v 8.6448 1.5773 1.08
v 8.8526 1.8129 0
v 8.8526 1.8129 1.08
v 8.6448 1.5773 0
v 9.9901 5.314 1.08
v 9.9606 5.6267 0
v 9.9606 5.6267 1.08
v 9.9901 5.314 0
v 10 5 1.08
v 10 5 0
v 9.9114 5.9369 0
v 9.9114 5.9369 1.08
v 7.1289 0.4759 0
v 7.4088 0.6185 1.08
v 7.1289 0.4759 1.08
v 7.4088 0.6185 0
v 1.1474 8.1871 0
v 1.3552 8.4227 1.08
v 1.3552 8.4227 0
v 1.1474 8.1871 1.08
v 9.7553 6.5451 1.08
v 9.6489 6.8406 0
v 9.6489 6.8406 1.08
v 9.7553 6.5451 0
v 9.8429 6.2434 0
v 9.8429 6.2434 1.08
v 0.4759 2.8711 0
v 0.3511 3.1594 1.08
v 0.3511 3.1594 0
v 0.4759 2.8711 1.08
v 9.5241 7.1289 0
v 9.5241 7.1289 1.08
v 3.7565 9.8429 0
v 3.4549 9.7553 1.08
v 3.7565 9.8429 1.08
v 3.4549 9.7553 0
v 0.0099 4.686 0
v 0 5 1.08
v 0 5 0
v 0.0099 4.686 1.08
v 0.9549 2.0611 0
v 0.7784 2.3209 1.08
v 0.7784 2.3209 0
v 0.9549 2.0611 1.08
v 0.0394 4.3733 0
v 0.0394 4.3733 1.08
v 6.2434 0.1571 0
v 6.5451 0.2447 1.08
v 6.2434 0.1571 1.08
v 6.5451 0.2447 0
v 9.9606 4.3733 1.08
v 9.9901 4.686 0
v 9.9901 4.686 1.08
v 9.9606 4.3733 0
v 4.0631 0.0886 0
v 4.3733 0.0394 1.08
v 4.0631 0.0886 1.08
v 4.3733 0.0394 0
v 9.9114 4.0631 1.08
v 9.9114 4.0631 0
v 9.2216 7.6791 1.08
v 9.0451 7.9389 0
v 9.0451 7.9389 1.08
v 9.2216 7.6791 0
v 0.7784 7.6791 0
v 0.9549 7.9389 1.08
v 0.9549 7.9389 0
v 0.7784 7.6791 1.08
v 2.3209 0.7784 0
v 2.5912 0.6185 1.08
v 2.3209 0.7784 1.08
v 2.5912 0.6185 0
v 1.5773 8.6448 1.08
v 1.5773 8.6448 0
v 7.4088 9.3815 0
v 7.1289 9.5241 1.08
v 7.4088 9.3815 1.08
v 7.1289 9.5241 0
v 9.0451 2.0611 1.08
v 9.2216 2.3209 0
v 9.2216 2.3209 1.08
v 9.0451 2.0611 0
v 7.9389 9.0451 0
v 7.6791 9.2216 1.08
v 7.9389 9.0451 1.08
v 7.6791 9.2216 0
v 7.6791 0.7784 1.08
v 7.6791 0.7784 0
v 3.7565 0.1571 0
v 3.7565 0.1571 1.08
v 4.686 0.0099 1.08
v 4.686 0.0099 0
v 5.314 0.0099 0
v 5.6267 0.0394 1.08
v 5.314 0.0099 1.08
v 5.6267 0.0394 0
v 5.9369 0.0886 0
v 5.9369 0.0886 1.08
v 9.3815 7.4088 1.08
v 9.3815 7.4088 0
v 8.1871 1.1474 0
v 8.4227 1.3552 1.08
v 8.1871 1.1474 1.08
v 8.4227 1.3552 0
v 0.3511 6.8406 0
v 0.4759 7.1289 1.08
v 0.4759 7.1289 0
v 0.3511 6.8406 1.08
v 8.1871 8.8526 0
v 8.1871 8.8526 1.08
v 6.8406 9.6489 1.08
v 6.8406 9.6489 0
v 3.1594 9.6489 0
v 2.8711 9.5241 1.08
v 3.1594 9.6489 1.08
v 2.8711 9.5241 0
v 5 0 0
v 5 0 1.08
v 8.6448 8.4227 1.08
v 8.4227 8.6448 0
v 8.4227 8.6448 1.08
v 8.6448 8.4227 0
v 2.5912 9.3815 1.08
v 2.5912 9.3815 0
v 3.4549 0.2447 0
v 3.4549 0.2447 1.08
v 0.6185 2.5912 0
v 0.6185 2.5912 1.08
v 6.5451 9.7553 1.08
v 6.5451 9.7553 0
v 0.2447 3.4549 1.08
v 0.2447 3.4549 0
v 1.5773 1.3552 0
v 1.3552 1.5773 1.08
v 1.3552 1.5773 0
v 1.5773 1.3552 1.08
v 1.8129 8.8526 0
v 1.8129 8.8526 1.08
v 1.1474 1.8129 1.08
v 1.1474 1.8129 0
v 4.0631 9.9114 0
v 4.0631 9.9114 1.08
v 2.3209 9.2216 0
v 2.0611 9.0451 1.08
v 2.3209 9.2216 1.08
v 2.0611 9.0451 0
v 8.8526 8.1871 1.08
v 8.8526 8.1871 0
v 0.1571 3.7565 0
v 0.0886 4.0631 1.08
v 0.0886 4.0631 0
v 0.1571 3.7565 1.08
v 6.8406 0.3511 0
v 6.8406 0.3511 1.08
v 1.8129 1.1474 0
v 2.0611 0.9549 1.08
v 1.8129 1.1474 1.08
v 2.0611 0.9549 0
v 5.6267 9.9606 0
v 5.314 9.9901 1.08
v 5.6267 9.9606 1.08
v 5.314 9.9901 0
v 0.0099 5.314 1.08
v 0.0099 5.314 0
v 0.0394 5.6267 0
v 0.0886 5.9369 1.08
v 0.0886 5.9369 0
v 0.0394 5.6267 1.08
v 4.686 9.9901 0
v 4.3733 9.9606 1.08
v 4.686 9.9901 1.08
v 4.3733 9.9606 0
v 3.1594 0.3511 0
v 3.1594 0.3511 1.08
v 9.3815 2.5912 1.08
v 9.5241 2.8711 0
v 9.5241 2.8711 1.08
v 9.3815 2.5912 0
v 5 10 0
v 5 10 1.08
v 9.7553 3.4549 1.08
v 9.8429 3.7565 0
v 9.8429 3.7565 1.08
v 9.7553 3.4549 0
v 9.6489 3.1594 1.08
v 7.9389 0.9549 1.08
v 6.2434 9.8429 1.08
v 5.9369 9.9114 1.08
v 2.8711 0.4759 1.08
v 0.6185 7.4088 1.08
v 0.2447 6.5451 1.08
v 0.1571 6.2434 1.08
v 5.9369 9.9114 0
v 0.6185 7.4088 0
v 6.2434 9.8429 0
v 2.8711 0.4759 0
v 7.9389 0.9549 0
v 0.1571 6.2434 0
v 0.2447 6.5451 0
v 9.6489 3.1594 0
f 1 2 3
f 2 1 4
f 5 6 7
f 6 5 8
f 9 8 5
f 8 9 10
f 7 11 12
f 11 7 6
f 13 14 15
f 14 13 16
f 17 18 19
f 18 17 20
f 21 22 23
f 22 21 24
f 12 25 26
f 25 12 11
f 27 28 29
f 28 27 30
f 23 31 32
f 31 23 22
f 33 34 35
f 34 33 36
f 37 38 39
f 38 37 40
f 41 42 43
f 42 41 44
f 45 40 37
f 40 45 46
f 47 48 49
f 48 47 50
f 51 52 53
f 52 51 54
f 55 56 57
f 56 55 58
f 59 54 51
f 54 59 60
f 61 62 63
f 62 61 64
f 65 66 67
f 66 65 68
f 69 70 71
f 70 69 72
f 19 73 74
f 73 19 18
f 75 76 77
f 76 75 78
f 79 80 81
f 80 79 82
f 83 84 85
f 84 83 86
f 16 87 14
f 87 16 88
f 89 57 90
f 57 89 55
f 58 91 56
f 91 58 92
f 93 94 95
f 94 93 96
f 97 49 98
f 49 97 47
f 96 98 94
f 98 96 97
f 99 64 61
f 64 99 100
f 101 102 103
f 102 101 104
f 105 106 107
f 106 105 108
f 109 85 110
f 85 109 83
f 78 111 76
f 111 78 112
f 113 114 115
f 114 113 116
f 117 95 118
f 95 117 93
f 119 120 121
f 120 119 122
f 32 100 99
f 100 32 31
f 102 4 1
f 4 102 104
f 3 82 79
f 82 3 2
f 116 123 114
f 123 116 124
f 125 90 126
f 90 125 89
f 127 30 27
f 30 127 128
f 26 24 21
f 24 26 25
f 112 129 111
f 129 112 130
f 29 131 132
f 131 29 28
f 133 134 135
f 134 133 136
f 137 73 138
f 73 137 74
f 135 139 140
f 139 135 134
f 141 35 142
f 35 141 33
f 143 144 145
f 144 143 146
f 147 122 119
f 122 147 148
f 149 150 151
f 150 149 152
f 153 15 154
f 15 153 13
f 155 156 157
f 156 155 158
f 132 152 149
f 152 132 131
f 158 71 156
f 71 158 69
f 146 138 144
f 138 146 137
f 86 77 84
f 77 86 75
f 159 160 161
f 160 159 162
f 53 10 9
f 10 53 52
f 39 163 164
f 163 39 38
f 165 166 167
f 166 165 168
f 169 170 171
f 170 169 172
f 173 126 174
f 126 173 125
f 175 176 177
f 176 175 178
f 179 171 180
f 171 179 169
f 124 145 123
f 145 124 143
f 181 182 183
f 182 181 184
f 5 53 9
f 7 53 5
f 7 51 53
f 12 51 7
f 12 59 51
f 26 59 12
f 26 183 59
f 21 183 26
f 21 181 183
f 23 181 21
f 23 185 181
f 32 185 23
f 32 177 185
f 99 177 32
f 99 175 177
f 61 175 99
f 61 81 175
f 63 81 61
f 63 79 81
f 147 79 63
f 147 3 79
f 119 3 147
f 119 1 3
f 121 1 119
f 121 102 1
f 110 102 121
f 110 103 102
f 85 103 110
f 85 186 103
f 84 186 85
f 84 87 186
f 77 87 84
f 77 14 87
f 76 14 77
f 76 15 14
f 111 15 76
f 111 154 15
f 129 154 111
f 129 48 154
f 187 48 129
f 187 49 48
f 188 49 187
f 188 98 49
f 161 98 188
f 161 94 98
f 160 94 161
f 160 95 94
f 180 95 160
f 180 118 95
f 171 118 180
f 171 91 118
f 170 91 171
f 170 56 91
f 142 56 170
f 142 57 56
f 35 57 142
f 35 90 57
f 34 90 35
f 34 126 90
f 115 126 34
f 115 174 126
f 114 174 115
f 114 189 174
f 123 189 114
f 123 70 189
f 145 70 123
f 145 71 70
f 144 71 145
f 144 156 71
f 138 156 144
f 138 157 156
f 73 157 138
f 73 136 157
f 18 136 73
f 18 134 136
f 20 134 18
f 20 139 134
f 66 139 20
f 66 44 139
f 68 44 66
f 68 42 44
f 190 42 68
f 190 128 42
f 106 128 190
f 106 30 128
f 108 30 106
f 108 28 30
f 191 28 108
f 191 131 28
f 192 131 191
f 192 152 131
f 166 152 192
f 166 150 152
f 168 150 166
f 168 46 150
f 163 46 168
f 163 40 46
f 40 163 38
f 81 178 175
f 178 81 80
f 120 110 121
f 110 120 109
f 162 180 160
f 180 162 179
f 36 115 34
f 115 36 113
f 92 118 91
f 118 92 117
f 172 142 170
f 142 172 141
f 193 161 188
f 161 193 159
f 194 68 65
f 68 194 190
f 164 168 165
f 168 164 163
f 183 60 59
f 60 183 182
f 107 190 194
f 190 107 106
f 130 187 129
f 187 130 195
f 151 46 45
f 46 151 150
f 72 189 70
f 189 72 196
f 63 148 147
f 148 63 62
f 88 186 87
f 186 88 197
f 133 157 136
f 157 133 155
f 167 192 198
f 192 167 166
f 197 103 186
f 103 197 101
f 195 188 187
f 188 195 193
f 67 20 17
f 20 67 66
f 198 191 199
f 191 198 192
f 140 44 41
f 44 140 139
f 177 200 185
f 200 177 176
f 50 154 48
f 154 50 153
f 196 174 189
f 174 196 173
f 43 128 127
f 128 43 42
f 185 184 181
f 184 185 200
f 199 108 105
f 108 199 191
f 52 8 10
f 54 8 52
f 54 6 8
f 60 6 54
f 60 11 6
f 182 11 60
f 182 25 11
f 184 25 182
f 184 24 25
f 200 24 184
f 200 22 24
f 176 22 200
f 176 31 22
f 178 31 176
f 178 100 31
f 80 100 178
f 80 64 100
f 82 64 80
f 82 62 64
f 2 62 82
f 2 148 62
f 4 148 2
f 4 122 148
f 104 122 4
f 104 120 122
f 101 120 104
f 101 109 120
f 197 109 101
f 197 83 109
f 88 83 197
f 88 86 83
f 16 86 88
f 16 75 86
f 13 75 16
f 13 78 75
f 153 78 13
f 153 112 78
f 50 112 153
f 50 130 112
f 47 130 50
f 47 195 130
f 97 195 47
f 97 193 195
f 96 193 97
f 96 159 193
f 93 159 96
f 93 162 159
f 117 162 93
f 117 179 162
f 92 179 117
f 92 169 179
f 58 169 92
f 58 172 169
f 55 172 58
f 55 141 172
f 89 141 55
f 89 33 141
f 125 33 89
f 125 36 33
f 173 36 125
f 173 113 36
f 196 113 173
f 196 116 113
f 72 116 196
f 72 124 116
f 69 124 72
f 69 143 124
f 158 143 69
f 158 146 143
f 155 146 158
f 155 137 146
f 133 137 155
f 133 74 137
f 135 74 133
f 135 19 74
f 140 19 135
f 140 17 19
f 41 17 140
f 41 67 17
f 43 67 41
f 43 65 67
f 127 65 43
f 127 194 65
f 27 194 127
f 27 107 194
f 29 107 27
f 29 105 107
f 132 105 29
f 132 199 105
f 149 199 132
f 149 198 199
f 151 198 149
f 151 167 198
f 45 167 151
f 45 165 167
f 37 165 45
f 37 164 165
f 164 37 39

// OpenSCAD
rad1= 85;
rad2=75;

/*
translate([0,-20/2 + 4,10/2 - 4])
rotate([0,90,180])
difference()
{
   cube([8,8,20], center=true);
   translate([0,0,-20/2]) cylinder(r1=4,r2=4,h=20,$fn=50);
   translate([4,0,0]) cube([8.02,8.02,l + 1], center=true);
   translate([0,-4,0]) cube([8.02,8.02,l + 1], center=true);
}
*/


/**
 * [inside_concave_edge description]
 * @param  {[type]} s=10 [description]
 * @param  {[type]} l=1  [description]
 * @return {[type]}      [description]
 *
 */
module inside_concave_edge(s=10,l=1)
{
  difference()
  {
    cube([s,s,l]);
    translate([s/2,s/2, -.02]) cylinder(r1=s/2,r2=s/2,h=l + .1,$fn=100);

    translate([-.02,s/2, -.02]) cube([s,s + .1,l + .1]);
    translate([s/2,-.02,-.02]) cube([s,s + .1,l + .1]);
  }

}

intersection()
{

  translate([10/2,10/2, -.02]) cylinder(r1=10/2,r2=10/2,h=1 + .1,$fn=100);

cube([10,10 + .1,1 + .1]);

}
